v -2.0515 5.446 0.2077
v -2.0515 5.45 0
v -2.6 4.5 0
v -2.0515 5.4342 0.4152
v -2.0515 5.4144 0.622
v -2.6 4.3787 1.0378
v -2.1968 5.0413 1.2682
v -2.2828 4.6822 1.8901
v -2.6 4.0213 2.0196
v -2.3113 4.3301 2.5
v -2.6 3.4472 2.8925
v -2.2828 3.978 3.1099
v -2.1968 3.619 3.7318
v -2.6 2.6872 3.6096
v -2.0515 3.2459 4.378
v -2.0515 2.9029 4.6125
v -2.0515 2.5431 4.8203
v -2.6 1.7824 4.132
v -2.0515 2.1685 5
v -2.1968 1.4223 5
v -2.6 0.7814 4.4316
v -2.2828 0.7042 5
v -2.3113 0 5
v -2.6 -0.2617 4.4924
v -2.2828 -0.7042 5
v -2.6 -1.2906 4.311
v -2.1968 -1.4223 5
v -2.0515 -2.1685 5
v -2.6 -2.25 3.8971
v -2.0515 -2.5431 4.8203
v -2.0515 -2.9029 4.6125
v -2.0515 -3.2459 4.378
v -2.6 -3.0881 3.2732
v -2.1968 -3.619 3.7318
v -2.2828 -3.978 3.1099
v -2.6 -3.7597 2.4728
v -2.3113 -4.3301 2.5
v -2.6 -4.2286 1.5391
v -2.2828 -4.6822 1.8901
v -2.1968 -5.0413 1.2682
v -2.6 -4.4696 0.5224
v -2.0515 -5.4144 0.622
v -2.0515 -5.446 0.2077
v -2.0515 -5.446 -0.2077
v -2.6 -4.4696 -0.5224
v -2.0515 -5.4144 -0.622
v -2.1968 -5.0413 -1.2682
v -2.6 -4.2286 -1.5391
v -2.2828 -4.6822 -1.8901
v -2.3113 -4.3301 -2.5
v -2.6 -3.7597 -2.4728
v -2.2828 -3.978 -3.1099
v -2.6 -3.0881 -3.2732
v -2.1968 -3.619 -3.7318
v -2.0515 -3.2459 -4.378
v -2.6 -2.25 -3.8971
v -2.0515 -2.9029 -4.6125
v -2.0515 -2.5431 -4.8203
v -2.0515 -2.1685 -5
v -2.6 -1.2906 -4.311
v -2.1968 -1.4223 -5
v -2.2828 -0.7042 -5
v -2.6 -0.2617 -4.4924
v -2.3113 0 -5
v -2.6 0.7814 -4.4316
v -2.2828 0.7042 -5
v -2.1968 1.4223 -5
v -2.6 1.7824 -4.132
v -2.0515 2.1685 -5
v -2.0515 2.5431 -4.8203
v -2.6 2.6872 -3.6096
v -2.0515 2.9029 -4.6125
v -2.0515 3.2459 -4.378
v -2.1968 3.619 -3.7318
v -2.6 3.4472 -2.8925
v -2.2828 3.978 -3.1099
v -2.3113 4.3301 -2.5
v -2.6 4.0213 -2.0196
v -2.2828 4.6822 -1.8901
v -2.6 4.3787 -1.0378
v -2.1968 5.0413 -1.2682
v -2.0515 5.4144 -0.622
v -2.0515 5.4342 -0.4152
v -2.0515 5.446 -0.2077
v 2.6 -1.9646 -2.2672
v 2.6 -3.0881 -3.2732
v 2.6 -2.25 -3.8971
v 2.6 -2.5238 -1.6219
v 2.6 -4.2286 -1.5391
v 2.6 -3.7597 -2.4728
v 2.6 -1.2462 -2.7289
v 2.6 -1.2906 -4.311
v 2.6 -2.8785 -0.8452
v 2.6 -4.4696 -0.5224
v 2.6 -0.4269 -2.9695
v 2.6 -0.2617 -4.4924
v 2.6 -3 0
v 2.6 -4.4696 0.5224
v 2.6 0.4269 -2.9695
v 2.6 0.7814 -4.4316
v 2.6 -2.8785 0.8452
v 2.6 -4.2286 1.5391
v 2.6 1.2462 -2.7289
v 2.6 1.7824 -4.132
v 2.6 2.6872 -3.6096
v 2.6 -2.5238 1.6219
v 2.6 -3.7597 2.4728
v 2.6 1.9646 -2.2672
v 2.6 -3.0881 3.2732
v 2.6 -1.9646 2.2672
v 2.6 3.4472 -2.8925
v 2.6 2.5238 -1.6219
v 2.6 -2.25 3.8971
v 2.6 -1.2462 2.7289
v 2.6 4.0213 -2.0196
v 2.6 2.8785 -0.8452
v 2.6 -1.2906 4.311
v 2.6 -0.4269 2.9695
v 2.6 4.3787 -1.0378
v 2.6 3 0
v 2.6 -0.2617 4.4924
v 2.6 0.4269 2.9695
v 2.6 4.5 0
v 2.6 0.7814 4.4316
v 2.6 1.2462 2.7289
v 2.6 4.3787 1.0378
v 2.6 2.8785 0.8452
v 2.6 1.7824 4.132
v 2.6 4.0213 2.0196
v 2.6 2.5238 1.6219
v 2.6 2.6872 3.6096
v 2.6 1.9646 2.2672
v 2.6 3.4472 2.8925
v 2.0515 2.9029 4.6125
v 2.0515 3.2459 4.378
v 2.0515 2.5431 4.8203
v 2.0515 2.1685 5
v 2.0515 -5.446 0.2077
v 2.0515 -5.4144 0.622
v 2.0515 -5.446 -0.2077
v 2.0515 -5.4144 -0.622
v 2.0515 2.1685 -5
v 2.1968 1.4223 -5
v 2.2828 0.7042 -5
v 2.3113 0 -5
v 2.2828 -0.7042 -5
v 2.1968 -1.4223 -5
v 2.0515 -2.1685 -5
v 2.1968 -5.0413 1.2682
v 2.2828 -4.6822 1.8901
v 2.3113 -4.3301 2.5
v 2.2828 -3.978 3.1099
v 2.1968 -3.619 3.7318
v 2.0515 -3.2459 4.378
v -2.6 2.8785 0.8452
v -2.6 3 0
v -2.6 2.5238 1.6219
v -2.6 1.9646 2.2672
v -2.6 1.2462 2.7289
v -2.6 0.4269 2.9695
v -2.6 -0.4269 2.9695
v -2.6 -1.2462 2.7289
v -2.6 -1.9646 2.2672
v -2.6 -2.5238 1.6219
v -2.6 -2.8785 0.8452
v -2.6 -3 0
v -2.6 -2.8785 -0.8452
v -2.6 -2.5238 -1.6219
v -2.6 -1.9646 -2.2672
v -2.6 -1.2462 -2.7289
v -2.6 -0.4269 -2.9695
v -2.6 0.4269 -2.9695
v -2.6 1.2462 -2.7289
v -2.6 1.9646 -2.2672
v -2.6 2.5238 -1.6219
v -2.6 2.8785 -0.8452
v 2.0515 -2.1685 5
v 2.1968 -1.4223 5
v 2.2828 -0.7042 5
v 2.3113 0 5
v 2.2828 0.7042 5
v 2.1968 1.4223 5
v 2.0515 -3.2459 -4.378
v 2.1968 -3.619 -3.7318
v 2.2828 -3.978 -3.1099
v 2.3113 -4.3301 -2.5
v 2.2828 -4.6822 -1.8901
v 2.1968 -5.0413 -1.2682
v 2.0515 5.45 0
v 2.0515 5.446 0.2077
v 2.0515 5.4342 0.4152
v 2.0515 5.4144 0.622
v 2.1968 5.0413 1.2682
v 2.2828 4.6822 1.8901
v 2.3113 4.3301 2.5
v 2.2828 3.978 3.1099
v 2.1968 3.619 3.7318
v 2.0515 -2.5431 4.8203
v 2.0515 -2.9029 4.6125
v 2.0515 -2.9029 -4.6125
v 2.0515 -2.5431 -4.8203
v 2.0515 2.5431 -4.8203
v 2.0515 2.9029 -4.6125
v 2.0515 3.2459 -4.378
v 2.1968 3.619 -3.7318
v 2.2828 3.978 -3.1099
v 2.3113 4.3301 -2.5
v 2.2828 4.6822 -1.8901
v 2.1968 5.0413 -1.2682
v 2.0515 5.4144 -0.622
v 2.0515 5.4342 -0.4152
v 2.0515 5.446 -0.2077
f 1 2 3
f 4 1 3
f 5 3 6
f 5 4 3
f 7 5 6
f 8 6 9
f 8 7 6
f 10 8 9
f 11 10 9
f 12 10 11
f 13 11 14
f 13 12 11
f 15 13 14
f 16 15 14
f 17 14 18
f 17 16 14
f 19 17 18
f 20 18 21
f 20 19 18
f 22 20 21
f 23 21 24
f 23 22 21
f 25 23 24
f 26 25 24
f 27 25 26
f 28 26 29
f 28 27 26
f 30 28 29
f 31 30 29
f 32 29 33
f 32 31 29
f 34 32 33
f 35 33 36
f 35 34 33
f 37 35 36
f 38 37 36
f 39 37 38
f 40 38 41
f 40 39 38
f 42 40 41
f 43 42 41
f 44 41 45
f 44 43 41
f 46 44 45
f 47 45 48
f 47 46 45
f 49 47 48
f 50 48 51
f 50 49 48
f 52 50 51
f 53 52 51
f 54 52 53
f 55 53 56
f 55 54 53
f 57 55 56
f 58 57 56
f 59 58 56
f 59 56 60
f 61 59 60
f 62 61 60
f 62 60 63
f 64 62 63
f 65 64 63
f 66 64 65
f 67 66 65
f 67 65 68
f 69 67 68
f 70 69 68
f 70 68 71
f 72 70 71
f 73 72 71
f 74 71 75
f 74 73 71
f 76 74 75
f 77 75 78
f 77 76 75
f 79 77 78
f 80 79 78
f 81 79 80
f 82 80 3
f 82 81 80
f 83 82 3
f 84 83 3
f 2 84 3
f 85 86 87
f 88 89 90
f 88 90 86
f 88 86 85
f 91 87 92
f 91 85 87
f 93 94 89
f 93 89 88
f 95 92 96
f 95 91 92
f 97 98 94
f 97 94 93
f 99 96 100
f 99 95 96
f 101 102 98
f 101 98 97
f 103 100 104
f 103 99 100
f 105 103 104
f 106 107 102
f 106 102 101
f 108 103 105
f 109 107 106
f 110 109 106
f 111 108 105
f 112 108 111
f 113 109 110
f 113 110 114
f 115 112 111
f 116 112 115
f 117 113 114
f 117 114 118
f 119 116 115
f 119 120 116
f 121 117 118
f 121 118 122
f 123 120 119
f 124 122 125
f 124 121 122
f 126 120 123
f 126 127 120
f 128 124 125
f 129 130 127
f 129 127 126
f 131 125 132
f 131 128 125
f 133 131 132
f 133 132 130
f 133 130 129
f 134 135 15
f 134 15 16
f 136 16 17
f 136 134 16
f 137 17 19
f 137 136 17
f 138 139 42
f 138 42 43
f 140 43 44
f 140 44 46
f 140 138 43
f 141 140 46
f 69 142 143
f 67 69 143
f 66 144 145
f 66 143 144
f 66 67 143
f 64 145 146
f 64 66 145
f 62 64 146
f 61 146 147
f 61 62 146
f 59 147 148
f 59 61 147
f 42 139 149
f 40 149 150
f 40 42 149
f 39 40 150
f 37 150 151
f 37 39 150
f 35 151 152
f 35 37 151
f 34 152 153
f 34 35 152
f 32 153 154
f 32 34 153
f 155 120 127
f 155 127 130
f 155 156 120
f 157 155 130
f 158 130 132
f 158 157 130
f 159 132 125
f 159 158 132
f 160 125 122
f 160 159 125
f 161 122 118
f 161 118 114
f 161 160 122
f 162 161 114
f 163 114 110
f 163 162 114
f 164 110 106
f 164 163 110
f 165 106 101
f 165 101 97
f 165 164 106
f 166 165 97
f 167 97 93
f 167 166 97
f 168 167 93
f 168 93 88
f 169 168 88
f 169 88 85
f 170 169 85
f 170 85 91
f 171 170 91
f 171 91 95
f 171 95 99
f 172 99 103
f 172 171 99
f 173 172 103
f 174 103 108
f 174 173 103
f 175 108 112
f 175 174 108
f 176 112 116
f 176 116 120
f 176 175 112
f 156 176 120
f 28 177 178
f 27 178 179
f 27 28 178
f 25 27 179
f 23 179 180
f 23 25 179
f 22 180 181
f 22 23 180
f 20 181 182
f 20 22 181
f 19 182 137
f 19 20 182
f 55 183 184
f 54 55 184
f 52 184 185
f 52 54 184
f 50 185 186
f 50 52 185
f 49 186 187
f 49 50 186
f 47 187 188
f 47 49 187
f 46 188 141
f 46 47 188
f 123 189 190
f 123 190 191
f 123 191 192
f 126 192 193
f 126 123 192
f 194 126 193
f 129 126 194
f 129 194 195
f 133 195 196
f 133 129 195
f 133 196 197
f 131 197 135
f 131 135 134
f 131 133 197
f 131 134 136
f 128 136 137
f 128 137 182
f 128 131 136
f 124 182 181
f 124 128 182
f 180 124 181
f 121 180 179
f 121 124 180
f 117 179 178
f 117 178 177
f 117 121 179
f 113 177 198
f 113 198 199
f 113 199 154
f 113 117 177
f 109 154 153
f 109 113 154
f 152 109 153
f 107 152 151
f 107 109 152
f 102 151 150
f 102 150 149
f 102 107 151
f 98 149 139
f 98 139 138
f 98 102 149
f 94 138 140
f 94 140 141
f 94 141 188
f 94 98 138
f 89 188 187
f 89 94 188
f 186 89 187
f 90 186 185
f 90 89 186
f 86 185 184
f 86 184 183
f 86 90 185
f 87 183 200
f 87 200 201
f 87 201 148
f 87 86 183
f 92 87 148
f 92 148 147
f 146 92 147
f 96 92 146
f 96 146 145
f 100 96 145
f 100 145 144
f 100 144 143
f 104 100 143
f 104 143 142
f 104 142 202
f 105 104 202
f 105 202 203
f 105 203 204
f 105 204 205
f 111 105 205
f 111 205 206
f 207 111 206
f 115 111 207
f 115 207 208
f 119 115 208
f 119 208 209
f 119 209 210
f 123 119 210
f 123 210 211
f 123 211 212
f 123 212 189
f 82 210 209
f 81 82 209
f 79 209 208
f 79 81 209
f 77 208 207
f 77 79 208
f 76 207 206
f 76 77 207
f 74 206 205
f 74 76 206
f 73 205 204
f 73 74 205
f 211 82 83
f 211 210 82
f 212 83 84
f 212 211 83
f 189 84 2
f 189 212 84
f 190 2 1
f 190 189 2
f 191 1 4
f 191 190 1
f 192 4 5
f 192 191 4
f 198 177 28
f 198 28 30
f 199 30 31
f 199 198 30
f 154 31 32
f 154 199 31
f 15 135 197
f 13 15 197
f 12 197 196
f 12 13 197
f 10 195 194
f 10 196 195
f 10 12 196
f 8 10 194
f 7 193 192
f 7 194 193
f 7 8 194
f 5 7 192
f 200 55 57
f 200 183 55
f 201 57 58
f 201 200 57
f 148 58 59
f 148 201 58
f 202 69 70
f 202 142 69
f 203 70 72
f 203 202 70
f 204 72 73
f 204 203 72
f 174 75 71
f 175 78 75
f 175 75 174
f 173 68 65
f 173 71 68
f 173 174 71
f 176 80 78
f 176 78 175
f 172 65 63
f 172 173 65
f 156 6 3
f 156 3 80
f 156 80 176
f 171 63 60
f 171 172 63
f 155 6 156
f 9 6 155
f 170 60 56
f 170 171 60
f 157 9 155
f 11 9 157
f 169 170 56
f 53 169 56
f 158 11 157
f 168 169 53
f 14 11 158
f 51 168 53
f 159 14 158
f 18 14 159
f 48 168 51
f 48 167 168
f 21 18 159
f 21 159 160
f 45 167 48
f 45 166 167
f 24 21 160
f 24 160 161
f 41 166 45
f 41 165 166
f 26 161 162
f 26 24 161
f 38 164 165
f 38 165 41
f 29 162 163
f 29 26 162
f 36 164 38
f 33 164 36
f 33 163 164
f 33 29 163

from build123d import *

# Parameters (mm, degrees)
SKETCH_2_OUTSIDE_W  = 16.154
SKETCH_2_OUTSIDE_H  = 16.154
CUT_EXTRUDE_1_DEPTH = 6.2


with BuildPart() as part:
    # Эскиз1 → Повернуть1 (revolve)
    with BuildSketch(Plane.XY):
        Polygon((2.6, 3), (-2.6, 3), (-2.6, 4.5), (-2.051517244, 5.45), (2.051517244, 5.45), (2.6, 4.5), align=None)
    revolve(axis=Axis((-345.378129483, 0, 0), (1, 0, 0)))

    # Эскиз2 outside → Вырез-Вытянуть1 (cut, through all)
    with BuildSketch(Plane.ZY.offset(2.6)):
        Rectangle(SKETCH_2_OUTSIDE_W, SKETCH_2_OUTSIDE_H)
        Polygon((0, -5.773502692), (5, -2.886751346), (5, 2.886751346), (0, 5.773502692), (-5, 2.886751346), (-5, -2.886751346), align=None, mode=Mode.SUBTRACT)
    extrude(amount=-CUT_EXTRUDE_1_DEPTH, mode=Mode.SUBTRACT)


solid = part.part
